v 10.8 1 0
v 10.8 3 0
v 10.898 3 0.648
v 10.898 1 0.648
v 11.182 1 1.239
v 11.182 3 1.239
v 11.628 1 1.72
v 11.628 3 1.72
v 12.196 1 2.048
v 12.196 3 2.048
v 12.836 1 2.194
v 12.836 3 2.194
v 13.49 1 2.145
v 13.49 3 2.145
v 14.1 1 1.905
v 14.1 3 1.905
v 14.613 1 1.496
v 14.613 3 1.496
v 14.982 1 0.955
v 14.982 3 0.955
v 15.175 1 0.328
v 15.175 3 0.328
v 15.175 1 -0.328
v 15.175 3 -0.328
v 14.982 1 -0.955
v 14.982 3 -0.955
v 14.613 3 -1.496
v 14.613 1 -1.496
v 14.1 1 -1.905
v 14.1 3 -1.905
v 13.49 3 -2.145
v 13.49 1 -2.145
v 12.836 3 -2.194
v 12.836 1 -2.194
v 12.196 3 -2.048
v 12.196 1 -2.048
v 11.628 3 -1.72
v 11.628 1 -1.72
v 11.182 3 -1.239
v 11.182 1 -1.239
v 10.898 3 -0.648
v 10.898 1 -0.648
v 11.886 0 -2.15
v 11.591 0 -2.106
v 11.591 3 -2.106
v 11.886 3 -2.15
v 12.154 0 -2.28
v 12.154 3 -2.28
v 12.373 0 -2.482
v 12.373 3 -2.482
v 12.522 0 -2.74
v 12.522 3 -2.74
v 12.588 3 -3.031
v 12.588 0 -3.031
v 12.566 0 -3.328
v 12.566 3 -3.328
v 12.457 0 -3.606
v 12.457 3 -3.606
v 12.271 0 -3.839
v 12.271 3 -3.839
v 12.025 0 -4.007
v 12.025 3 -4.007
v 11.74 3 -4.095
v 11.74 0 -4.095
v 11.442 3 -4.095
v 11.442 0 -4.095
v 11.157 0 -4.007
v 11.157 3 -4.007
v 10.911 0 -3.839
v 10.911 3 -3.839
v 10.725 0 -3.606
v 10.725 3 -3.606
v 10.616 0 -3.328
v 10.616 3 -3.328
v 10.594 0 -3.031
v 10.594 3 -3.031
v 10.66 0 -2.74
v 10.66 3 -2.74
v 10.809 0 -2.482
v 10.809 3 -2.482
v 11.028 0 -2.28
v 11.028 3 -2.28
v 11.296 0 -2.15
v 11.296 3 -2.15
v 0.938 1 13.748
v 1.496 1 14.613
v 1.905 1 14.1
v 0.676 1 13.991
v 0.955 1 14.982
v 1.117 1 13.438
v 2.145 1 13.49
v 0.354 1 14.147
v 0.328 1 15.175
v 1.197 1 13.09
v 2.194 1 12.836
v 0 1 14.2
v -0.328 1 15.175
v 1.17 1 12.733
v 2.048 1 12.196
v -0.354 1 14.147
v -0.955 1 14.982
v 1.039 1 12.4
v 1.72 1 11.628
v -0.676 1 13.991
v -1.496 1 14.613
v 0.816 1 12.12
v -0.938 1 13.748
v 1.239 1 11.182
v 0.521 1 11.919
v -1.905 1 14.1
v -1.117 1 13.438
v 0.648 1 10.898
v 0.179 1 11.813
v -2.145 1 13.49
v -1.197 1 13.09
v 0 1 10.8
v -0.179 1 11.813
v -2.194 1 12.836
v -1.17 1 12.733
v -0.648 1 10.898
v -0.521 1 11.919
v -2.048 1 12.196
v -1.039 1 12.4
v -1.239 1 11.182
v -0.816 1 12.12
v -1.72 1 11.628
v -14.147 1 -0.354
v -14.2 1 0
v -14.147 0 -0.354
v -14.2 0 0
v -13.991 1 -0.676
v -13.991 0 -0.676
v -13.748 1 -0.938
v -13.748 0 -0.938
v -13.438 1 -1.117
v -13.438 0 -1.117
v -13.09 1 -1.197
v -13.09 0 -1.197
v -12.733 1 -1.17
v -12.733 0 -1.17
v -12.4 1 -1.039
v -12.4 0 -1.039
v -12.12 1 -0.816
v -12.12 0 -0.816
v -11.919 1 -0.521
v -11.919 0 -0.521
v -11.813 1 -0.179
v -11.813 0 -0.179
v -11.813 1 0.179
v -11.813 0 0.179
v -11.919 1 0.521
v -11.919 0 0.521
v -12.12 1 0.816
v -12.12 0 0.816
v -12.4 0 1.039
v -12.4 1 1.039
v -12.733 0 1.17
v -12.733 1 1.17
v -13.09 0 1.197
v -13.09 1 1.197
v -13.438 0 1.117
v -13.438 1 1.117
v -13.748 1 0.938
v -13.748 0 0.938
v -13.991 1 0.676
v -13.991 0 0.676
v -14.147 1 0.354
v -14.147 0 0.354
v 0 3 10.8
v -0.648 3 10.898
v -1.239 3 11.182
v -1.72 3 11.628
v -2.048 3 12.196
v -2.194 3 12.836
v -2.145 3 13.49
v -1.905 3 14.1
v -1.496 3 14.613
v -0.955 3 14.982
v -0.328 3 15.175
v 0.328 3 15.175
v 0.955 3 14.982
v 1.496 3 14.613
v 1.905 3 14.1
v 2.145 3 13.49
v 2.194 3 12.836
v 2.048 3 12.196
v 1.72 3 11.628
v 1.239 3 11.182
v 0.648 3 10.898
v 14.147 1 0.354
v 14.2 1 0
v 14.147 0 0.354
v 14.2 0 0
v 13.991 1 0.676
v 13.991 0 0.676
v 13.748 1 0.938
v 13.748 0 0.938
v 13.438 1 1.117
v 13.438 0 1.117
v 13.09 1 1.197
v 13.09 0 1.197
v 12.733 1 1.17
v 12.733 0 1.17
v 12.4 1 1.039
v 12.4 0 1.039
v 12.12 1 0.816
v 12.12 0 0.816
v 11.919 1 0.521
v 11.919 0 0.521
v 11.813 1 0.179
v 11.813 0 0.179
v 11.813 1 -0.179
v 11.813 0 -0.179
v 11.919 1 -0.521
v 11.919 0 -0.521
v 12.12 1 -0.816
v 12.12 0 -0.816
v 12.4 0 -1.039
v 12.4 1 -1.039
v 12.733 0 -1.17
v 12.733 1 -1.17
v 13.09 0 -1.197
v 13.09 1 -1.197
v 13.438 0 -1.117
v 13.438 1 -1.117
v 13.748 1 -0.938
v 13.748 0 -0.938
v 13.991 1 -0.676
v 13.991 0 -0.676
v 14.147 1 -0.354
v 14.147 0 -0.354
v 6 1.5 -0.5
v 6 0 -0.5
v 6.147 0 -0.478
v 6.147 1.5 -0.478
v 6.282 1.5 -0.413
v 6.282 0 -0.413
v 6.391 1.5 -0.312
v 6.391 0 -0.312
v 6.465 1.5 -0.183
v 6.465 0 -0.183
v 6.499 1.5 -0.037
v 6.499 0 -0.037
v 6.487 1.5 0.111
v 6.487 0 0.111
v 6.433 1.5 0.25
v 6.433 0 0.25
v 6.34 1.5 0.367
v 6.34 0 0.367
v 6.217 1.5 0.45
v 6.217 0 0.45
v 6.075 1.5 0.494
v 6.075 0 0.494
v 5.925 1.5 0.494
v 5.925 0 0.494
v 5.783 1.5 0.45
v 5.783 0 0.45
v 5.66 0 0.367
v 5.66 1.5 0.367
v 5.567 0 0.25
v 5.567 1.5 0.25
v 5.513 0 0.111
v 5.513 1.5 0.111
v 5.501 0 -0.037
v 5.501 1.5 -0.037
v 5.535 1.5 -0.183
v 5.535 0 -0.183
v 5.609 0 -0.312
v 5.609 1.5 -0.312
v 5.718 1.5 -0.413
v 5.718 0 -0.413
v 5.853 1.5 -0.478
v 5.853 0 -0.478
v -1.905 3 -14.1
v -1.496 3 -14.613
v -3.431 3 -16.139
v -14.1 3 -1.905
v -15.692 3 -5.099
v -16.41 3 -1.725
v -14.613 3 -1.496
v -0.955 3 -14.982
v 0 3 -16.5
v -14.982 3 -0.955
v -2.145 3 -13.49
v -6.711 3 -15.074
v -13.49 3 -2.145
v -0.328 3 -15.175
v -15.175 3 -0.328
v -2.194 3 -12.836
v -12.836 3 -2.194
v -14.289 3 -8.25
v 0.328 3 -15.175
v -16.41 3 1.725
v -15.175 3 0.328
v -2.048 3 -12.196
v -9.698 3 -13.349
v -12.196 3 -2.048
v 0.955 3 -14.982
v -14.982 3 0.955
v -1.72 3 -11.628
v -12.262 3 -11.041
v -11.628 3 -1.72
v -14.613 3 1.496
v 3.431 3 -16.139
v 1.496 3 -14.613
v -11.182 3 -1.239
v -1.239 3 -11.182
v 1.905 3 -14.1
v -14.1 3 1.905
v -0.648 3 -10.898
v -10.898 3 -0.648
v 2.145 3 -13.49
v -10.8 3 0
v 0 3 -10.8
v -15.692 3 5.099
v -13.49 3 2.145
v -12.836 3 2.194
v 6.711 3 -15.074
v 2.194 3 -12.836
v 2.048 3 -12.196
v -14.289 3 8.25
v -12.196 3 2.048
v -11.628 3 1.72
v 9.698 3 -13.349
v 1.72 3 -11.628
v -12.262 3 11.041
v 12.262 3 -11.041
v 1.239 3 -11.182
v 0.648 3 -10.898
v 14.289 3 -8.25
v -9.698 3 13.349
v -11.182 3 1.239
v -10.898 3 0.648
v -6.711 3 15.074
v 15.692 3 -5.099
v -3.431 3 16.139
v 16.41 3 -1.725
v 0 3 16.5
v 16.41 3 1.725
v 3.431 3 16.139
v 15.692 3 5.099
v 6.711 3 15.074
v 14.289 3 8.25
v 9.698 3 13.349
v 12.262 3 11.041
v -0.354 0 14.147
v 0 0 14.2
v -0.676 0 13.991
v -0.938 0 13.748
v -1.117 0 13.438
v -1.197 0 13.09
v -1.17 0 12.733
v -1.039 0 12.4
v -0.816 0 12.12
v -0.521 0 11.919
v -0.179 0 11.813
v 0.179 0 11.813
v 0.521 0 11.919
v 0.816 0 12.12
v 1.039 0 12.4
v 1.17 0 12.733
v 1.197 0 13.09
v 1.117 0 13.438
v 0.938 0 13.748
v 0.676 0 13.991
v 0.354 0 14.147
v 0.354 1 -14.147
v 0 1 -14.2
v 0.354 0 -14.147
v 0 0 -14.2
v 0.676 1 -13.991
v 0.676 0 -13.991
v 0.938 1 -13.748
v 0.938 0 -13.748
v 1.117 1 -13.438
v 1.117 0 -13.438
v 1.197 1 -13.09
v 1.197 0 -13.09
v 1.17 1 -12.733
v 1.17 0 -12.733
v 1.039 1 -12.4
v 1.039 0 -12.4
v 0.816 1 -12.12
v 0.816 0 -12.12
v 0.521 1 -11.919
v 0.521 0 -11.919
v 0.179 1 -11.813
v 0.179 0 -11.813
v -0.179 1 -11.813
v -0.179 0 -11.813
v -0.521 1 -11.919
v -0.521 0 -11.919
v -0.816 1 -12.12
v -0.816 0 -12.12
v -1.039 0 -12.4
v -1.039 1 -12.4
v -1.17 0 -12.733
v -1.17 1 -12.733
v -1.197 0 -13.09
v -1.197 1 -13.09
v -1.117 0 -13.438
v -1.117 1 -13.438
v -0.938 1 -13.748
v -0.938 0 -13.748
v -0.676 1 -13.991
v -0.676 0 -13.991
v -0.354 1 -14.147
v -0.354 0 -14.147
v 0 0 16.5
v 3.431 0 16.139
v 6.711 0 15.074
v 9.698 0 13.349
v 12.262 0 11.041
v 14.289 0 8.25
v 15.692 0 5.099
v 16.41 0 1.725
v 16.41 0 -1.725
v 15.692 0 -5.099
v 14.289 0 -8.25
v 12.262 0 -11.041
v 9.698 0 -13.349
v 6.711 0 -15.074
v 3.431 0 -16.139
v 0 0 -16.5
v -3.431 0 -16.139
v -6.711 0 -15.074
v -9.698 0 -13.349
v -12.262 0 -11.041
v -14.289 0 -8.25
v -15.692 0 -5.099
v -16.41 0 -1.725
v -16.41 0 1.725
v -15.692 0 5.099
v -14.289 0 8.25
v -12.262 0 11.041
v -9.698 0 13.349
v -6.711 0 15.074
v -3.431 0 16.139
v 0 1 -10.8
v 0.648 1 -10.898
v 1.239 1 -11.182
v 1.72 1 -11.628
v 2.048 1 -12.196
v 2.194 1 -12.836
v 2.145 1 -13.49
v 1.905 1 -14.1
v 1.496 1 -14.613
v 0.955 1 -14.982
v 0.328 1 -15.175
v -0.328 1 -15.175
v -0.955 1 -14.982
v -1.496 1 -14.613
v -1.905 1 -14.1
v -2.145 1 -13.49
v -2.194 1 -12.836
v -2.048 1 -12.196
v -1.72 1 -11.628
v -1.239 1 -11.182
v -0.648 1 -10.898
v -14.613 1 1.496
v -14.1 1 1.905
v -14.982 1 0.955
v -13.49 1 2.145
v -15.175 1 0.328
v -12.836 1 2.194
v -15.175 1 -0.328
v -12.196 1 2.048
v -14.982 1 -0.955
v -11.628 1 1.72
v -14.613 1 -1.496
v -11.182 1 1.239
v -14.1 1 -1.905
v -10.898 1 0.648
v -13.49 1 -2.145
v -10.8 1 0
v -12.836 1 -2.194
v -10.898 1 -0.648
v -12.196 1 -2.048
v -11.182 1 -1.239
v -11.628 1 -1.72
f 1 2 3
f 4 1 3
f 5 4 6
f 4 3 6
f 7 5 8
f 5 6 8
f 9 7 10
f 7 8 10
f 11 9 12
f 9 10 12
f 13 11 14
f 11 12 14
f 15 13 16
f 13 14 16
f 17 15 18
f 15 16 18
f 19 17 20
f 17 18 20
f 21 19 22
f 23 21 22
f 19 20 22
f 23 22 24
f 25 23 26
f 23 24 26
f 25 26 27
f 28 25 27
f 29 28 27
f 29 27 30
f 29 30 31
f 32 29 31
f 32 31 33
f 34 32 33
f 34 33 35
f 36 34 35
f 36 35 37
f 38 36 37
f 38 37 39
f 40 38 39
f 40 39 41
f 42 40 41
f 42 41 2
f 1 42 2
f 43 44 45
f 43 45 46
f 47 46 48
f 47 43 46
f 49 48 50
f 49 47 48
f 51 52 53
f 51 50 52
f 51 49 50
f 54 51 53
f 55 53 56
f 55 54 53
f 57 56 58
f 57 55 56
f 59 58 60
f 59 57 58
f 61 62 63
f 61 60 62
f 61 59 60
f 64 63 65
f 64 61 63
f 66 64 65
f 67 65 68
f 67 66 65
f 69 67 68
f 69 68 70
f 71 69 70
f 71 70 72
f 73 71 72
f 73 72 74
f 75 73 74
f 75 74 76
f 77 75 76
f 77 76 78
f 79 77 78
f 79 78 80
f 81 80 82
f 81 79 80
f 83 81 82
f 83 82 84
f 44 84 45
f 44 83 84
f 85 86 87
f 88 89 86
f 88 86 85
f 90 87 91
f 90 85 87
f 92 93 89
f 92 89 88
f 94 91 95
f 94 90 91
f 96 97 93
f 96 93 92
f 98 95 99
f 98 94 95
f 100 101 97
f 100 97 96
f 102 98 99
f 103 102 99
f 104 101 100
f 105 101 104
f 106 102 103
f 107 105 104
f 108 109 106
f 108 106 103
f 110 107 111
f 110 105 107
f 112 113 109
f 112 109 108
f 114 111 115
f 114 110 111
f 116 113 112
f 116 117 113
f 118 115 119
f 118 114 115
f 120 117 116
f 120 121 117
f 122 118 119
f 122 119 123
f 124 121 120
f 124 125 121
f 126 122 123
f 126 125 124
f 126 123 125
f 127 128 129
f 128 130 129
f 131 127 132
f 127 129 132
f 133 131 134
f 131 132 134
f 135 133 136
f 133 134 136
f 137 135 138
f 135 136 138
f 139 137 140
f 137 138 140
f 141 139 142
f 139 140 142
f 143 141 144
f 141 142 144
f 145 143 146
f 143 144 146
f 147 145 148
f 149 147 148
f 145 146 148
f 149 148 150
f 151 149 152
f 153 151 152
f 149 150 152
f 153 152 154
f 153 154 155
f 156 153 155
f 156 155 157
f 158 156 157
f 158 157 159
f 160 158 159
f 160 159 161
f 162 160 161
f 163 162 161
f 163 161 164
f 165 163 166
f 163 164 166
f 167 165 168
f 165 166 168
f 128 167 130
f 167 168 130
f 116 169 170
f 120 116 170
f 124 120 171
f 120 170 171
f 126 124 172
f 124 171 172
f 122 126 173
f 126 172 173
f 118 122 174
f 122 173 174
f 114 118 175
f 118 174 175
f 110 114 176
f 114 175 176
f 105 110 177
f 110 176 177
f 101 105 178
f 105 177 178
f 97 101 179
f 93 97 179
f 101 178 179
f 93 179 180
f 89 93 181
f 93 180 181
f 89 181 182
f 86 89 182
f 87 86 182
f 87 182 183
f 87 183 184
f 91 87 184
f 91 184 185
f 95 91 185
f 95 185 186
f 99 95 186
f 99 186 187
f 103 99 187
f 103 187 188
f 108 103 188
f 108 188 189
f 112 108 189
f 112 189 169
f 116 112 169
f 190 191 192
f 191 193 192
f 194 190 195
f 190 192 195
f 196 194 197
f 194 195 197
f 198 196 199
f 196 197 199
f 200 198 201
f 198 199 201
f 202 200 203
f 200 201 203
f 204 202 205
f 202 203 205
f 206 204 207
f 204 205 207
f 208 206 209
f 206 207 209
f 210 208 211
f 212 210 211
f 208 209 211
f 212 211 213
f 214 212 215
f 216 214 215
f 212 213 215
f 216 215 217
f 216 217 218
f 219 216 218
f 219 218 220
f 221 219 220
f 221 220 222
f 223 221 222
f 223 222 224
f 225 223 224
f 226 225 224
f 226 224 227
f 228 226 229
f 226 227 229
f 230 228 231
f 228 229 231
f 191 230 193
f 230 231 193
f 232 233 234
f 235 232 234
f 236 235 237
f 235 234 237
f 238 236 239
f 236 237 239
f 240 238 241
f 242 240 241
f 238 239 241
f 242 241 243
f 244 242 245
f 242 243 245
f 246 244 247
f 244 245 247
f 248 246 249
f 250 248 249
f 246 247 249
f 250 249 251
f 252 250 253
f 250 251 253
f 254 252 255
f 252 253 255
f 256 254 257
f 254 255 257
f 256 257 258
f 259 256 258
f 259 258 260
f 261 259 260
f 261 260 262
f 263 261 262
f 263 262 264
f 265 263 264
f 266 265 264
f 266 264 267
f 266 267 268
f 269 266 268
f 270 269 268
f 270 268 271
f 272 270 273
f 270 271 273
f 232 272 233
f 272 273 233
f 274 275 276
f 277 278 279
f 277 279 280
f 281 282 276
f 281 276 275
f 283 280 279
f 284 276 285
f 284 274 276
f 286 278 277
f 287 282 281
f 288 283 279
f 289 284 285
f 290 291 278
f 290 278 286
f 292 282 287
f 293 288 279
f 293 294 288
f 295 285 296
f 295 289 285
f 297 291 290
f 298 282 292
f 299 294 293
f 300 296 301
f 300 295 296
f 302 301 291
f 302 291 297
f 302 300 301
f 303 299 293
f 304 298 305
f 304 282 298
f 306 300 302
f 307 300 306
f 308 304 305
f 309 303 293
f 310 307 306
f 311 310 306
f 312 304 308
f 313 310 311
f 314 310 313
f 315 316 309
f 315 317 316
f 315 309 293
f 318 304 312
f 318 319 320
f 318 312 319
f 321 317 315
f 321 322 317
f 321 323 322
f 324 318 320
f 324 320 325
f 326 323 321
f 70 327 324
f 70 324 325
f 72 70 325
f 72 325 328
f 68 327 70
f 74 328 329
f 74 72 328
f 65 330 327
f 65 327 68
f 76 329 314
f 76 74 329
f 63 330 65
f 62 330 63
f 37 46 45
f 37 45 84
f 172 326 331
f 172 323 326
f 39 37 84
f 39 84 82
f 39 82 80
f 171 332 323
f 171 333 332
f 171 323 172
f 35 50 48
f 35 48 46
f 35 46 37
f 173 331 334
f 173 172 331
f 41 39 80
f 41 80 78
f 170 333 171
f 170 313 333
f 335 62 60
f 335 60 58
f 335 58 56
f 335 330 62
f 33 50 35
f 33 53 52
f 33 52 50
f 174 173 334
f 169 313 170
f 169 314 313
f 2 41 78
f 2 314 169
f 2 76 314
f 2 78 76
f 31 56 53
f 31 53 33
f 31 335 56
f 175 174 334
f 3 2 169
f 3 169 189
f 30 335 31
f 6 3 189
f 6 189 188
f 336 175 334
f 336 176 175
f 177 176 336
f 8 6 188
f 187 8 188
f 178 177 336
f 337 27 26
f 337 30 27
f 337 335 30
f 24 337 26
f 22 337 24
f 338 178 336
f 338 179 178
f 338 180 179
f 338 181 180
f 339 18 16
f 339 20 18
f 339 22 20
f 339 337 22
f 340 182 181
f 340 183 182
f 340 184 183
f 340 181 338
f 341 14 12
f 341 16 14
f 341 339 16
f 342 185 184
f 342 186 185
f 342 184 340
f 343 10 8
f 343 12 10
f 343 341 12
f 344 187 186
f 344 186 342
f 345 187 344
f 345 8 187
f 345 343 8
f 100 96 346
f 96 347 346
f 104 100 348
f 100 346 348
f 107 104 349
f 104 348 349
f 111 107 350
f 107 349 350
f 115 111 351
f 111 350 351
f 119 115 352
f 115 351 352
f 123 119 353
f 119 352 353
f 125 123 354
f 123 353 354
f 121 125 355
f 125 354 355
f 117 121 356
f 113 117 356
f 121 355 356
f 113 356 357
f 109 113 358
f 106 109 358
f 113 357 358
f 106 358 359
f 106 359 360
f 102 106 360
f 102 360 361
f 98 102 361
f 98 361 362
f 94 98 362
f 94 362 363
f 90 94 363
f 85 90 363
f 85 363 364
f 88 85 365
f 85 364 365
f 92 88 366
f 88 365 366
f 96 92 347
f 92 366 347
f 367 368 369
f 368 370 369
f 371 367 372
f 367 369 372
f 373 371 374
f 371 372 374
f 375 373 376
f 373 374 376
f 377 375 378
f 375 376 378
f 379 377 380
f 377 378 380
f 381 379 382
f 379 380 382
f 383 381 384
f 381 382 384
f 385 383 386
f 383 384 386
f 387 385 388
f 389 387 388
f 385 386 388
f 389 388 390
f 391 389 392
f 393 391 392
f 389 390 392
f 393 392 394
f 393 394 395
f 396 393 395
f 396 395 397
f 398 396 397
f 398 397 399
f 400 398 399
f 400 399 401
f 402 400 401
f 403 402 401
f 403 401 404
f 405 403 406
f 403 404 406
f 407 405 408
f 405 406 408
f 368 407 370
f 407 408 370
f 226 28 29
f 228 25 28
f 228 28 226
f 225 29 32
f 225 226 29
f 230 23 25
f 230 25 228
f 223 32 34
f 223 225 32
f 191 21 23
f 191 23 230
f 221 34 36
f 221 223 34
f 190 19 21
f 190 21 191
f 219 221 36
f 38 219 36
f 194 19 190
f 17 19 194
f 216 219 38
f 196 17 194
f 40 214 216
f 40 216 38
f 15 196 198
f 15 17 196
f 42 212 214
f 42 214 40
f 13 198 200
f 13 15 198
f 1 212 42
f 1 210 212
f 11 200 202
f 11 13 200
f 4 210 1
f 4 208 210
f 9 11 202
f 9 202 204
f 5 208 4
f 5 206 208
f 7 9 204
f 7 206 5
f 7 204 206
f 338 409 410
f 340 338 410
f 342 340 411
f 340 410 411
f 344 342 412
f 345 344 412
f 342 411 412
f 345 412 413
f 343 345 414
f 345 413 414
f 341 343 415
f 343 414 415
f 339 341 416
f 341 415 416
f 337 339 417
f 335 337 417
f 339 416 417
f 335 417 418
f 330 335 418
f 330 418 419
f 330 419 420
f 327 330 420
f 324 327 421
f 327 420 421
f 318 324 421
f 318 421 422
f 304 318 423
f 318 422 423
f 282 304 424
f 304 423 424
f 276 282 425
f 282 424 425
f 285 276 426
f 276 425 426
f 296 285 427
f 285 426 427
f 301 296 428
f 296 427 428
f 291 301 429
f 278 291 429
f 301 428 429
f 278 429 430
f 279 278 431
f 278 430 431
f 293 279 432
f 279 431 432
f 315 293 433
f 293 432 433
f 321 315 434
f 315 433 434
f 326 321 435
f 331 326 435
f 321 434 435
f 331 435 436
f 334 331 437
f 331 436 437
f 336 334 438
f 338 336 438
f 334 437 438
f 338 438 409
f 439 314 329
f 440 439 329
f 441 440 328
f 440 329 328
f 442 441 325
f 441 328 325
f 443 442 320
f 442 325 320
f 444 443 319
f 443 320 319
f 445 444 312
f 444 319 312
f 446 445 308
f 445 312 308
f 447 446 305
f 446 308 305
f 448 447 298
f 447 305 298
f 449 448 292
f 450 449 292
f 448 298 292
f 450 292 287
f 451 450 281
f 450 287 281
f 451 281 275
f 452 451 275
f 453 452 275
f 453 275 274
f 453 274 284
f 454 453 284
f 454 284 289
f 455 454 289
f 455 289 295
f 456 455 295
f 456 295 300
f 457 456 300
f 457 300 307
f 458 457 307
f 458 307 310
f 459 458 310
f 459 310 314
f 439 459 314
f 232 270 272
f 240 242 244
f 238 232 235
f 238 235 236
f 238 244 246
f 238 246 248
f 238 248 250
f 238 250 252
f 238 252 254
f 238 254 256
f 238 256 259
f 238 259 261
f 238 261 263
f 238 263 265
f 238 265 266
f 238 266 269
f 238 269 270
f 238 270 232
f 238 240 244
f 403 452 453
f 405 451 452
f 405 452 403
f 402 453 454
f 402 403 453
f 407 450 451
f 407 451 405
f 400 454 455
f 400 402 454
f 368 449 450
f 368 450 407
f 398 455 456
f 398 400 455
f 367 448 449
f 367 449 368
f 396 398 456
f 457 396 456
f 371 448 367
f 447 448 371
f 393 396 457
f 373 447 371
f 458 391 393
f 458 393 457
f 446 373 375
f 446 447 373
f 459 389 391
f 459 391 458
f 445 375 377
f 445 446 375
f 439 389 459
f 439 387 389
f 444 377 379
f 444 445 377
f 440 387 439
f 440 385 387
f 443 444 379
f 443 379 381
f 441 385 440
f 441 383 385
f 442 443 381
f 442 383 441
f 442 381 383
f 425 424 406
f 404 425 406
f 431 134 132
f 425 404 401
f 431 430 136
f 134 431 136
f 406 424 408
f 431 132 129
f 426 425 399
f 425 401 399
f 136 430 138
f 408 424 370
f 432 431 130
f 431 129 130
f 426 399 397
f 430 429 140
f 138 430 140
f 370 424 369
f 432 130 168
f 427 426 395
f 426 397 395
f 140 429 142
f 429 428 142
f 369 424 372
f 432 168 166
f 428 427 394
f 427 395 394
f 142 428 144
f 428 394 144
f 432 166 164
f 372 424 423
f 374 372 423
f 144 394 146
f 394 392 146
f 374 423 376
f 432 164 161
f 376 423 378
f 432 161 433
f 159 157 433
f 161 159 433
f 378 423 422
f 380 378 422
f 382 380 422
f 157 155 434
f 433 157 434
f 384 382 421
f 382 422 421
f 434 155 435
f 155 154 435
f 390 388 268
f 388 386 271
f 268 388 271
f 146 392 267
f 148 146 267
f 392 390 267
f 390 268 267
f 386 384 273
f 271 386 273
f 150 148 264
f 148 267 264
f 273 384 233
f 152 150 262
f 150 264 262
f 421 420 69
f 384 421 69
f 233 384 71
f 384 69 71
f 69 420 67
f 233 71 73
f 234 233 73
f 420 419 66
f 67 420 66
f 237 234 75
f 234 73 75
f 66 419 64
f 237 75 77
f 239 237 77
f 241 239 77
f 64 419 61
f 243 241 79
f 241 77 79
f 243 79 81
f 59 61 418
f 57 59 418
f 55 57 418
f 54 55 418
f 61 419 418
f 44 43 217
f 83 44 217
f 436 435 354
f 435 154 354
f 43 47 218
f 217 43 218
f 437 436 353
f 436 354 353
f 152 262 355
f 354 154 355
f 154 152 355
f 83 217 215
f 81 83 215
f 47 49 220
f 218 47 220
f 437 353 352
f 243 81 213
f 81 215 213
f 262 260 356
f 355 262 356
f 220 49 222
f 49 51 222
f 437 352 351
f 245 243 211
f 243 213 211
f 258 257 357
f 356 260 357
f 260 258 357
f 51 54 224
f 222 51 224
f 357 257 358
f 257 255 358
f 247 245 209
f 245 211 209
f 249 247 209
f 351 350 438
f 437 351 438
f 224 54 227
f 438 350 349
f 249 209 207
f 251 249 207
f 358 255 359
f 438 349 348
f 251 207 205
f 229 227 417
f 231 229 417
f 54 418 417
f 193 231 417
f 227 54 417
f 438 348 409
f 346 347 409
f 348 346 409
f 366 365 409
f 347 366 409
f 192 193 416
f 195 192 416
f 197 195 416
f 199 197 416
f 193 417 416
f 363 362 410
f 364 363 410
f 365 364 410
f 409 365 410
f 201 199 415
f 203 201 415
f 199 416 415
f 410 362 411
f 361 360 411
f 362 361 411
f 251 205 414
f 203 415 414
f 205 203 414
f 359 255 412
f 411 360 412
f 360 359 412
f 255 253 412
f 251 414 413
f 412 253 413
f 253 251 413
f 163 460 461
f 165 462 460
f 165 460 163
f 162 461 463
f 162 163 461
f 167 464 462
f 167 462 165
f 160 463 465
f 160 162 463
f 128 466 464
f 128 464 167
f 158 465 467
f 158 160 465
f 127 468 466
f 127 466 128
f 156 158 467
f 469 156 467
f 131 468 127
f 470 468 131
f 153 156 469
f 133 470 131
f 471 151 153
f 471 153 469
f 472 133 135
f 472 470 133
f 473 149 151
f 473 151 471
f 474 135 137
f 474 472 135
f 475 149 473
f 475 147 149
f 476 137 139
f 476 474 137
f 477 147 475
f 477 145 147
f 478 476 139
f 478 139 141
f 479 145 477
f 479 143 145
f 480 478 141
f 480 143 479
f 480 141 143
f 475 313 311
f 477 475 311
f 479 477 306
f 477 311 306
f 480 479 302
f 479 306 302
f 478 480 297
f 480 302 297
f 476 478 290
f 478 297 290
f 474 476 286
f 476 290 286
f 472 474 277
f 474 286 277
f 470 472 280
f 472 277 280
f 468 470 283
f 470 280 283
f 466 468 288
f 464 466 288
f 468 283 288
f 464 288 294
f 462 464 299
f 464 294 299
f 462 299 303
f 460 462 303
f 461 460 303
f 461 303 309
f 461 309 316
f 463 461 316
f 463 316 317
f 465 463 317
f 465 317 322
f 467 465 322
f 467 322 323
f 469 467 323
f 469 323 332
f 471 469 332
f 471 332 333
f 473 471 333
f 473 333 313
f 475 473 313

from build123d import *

# Parameters (mm, degrees)
SKETCH1_R                      = 16.5
BOSS_EXTRUDE1_DEPTH            = 3
CBORE_FOR_M2_SHCS1_D           = 2.4
CBORE_FOR_M2_SHCS1_CBORE_D     = 4.4
CBORE_FOR_M2_SHCS1_CBORE_DEPTH = 2
CIRPATTERN1_COUNT              = 4
SKETCH15_R                     = 0.5
CUT_EXTRUDE1_DEPTH             = 1.5
CUT_EXTRUDE2_DEPTH             = 24.526580712
CUT_EXTRUDE2_DEPTH_BACK        = 24.526580712
SKETCH16_R                     = 1


with BuildPart() as part:
    # Sketch1 → Boss-Extrude1 (new body)
    with BuildSketch(Plane(origin=(0, 0, 0), x_dir=(1, 0, 0), z_dir=(0, 1, 0))):
        with Locations(Location((0, 0, 0), (0, 0, 270))):
            Circle(SKETCH1_R)
    extrude(amount=BOSS_EXTRUDE1_DEPTH)

    # CBORE for M2 SHCS1 (through all)
    with Locations(Plane(origin=(0, 3, 0), x_dir=(1, 0, 0), z_dir=(0, 1, 0))):
        with Locations((-13, 0)):
            cbore_for_m2_shcs1 = CounterBoreHole(CBORE_FOR_M2_SHCS1_D / 2, CBORE_FOR_M2_SHCS1_CBORE_D / 2, CBORE_FOR_M2_SHCS1_CBORE_DEPTH)

    # CirPattern1: CBORE for M2 SHCS1 ×4 about axis
    cirpattern1_axis = Axis((0, 0, 0), (0, 1, 0))
    for i in range(1, CIRPATTERN1_COUNT):
        add(cbore_for_m2_shcs1.rotate(cirpattern1_axis, i * 360 / CIRPATTERN1_COUNT), mode=Mode.SUBTRACT)

    # Sketch15 → Cut-Extrude1 (cut)
    with BuildSketch(Plane.XZ):
        with Locations(Location((6, 0, 0), (0, 0, 270))):
            Circle(SKETCH15_R)
    extrude(amount=-CUT_EXTRUDE1_DEPTH, mode=Mode.SUBTRACT)

    # Sketch16 → Cut-Extrude2 (cut, two sides: drawn at the far end of the back side and taken through both)
    with BuildSketch(Plane(origin=(0, 3, 0), x_dir=(1, 0, 0), z_dir=(0, 1, 0)).offset(-CUT_EXTRUDE2_DEPTH_BACK)):
        with Locations(Location((11.591109915, 3.105828541, 0), (0, 0, 270))):
            Circle(SKETCH16_R)
    extrude(amount=CUT_EXTRUDE2_DEPTH + CUT_EXTRUDE2_DEPTH_BACK, mode=Mode.SUBTRACT)


solid = part.part
